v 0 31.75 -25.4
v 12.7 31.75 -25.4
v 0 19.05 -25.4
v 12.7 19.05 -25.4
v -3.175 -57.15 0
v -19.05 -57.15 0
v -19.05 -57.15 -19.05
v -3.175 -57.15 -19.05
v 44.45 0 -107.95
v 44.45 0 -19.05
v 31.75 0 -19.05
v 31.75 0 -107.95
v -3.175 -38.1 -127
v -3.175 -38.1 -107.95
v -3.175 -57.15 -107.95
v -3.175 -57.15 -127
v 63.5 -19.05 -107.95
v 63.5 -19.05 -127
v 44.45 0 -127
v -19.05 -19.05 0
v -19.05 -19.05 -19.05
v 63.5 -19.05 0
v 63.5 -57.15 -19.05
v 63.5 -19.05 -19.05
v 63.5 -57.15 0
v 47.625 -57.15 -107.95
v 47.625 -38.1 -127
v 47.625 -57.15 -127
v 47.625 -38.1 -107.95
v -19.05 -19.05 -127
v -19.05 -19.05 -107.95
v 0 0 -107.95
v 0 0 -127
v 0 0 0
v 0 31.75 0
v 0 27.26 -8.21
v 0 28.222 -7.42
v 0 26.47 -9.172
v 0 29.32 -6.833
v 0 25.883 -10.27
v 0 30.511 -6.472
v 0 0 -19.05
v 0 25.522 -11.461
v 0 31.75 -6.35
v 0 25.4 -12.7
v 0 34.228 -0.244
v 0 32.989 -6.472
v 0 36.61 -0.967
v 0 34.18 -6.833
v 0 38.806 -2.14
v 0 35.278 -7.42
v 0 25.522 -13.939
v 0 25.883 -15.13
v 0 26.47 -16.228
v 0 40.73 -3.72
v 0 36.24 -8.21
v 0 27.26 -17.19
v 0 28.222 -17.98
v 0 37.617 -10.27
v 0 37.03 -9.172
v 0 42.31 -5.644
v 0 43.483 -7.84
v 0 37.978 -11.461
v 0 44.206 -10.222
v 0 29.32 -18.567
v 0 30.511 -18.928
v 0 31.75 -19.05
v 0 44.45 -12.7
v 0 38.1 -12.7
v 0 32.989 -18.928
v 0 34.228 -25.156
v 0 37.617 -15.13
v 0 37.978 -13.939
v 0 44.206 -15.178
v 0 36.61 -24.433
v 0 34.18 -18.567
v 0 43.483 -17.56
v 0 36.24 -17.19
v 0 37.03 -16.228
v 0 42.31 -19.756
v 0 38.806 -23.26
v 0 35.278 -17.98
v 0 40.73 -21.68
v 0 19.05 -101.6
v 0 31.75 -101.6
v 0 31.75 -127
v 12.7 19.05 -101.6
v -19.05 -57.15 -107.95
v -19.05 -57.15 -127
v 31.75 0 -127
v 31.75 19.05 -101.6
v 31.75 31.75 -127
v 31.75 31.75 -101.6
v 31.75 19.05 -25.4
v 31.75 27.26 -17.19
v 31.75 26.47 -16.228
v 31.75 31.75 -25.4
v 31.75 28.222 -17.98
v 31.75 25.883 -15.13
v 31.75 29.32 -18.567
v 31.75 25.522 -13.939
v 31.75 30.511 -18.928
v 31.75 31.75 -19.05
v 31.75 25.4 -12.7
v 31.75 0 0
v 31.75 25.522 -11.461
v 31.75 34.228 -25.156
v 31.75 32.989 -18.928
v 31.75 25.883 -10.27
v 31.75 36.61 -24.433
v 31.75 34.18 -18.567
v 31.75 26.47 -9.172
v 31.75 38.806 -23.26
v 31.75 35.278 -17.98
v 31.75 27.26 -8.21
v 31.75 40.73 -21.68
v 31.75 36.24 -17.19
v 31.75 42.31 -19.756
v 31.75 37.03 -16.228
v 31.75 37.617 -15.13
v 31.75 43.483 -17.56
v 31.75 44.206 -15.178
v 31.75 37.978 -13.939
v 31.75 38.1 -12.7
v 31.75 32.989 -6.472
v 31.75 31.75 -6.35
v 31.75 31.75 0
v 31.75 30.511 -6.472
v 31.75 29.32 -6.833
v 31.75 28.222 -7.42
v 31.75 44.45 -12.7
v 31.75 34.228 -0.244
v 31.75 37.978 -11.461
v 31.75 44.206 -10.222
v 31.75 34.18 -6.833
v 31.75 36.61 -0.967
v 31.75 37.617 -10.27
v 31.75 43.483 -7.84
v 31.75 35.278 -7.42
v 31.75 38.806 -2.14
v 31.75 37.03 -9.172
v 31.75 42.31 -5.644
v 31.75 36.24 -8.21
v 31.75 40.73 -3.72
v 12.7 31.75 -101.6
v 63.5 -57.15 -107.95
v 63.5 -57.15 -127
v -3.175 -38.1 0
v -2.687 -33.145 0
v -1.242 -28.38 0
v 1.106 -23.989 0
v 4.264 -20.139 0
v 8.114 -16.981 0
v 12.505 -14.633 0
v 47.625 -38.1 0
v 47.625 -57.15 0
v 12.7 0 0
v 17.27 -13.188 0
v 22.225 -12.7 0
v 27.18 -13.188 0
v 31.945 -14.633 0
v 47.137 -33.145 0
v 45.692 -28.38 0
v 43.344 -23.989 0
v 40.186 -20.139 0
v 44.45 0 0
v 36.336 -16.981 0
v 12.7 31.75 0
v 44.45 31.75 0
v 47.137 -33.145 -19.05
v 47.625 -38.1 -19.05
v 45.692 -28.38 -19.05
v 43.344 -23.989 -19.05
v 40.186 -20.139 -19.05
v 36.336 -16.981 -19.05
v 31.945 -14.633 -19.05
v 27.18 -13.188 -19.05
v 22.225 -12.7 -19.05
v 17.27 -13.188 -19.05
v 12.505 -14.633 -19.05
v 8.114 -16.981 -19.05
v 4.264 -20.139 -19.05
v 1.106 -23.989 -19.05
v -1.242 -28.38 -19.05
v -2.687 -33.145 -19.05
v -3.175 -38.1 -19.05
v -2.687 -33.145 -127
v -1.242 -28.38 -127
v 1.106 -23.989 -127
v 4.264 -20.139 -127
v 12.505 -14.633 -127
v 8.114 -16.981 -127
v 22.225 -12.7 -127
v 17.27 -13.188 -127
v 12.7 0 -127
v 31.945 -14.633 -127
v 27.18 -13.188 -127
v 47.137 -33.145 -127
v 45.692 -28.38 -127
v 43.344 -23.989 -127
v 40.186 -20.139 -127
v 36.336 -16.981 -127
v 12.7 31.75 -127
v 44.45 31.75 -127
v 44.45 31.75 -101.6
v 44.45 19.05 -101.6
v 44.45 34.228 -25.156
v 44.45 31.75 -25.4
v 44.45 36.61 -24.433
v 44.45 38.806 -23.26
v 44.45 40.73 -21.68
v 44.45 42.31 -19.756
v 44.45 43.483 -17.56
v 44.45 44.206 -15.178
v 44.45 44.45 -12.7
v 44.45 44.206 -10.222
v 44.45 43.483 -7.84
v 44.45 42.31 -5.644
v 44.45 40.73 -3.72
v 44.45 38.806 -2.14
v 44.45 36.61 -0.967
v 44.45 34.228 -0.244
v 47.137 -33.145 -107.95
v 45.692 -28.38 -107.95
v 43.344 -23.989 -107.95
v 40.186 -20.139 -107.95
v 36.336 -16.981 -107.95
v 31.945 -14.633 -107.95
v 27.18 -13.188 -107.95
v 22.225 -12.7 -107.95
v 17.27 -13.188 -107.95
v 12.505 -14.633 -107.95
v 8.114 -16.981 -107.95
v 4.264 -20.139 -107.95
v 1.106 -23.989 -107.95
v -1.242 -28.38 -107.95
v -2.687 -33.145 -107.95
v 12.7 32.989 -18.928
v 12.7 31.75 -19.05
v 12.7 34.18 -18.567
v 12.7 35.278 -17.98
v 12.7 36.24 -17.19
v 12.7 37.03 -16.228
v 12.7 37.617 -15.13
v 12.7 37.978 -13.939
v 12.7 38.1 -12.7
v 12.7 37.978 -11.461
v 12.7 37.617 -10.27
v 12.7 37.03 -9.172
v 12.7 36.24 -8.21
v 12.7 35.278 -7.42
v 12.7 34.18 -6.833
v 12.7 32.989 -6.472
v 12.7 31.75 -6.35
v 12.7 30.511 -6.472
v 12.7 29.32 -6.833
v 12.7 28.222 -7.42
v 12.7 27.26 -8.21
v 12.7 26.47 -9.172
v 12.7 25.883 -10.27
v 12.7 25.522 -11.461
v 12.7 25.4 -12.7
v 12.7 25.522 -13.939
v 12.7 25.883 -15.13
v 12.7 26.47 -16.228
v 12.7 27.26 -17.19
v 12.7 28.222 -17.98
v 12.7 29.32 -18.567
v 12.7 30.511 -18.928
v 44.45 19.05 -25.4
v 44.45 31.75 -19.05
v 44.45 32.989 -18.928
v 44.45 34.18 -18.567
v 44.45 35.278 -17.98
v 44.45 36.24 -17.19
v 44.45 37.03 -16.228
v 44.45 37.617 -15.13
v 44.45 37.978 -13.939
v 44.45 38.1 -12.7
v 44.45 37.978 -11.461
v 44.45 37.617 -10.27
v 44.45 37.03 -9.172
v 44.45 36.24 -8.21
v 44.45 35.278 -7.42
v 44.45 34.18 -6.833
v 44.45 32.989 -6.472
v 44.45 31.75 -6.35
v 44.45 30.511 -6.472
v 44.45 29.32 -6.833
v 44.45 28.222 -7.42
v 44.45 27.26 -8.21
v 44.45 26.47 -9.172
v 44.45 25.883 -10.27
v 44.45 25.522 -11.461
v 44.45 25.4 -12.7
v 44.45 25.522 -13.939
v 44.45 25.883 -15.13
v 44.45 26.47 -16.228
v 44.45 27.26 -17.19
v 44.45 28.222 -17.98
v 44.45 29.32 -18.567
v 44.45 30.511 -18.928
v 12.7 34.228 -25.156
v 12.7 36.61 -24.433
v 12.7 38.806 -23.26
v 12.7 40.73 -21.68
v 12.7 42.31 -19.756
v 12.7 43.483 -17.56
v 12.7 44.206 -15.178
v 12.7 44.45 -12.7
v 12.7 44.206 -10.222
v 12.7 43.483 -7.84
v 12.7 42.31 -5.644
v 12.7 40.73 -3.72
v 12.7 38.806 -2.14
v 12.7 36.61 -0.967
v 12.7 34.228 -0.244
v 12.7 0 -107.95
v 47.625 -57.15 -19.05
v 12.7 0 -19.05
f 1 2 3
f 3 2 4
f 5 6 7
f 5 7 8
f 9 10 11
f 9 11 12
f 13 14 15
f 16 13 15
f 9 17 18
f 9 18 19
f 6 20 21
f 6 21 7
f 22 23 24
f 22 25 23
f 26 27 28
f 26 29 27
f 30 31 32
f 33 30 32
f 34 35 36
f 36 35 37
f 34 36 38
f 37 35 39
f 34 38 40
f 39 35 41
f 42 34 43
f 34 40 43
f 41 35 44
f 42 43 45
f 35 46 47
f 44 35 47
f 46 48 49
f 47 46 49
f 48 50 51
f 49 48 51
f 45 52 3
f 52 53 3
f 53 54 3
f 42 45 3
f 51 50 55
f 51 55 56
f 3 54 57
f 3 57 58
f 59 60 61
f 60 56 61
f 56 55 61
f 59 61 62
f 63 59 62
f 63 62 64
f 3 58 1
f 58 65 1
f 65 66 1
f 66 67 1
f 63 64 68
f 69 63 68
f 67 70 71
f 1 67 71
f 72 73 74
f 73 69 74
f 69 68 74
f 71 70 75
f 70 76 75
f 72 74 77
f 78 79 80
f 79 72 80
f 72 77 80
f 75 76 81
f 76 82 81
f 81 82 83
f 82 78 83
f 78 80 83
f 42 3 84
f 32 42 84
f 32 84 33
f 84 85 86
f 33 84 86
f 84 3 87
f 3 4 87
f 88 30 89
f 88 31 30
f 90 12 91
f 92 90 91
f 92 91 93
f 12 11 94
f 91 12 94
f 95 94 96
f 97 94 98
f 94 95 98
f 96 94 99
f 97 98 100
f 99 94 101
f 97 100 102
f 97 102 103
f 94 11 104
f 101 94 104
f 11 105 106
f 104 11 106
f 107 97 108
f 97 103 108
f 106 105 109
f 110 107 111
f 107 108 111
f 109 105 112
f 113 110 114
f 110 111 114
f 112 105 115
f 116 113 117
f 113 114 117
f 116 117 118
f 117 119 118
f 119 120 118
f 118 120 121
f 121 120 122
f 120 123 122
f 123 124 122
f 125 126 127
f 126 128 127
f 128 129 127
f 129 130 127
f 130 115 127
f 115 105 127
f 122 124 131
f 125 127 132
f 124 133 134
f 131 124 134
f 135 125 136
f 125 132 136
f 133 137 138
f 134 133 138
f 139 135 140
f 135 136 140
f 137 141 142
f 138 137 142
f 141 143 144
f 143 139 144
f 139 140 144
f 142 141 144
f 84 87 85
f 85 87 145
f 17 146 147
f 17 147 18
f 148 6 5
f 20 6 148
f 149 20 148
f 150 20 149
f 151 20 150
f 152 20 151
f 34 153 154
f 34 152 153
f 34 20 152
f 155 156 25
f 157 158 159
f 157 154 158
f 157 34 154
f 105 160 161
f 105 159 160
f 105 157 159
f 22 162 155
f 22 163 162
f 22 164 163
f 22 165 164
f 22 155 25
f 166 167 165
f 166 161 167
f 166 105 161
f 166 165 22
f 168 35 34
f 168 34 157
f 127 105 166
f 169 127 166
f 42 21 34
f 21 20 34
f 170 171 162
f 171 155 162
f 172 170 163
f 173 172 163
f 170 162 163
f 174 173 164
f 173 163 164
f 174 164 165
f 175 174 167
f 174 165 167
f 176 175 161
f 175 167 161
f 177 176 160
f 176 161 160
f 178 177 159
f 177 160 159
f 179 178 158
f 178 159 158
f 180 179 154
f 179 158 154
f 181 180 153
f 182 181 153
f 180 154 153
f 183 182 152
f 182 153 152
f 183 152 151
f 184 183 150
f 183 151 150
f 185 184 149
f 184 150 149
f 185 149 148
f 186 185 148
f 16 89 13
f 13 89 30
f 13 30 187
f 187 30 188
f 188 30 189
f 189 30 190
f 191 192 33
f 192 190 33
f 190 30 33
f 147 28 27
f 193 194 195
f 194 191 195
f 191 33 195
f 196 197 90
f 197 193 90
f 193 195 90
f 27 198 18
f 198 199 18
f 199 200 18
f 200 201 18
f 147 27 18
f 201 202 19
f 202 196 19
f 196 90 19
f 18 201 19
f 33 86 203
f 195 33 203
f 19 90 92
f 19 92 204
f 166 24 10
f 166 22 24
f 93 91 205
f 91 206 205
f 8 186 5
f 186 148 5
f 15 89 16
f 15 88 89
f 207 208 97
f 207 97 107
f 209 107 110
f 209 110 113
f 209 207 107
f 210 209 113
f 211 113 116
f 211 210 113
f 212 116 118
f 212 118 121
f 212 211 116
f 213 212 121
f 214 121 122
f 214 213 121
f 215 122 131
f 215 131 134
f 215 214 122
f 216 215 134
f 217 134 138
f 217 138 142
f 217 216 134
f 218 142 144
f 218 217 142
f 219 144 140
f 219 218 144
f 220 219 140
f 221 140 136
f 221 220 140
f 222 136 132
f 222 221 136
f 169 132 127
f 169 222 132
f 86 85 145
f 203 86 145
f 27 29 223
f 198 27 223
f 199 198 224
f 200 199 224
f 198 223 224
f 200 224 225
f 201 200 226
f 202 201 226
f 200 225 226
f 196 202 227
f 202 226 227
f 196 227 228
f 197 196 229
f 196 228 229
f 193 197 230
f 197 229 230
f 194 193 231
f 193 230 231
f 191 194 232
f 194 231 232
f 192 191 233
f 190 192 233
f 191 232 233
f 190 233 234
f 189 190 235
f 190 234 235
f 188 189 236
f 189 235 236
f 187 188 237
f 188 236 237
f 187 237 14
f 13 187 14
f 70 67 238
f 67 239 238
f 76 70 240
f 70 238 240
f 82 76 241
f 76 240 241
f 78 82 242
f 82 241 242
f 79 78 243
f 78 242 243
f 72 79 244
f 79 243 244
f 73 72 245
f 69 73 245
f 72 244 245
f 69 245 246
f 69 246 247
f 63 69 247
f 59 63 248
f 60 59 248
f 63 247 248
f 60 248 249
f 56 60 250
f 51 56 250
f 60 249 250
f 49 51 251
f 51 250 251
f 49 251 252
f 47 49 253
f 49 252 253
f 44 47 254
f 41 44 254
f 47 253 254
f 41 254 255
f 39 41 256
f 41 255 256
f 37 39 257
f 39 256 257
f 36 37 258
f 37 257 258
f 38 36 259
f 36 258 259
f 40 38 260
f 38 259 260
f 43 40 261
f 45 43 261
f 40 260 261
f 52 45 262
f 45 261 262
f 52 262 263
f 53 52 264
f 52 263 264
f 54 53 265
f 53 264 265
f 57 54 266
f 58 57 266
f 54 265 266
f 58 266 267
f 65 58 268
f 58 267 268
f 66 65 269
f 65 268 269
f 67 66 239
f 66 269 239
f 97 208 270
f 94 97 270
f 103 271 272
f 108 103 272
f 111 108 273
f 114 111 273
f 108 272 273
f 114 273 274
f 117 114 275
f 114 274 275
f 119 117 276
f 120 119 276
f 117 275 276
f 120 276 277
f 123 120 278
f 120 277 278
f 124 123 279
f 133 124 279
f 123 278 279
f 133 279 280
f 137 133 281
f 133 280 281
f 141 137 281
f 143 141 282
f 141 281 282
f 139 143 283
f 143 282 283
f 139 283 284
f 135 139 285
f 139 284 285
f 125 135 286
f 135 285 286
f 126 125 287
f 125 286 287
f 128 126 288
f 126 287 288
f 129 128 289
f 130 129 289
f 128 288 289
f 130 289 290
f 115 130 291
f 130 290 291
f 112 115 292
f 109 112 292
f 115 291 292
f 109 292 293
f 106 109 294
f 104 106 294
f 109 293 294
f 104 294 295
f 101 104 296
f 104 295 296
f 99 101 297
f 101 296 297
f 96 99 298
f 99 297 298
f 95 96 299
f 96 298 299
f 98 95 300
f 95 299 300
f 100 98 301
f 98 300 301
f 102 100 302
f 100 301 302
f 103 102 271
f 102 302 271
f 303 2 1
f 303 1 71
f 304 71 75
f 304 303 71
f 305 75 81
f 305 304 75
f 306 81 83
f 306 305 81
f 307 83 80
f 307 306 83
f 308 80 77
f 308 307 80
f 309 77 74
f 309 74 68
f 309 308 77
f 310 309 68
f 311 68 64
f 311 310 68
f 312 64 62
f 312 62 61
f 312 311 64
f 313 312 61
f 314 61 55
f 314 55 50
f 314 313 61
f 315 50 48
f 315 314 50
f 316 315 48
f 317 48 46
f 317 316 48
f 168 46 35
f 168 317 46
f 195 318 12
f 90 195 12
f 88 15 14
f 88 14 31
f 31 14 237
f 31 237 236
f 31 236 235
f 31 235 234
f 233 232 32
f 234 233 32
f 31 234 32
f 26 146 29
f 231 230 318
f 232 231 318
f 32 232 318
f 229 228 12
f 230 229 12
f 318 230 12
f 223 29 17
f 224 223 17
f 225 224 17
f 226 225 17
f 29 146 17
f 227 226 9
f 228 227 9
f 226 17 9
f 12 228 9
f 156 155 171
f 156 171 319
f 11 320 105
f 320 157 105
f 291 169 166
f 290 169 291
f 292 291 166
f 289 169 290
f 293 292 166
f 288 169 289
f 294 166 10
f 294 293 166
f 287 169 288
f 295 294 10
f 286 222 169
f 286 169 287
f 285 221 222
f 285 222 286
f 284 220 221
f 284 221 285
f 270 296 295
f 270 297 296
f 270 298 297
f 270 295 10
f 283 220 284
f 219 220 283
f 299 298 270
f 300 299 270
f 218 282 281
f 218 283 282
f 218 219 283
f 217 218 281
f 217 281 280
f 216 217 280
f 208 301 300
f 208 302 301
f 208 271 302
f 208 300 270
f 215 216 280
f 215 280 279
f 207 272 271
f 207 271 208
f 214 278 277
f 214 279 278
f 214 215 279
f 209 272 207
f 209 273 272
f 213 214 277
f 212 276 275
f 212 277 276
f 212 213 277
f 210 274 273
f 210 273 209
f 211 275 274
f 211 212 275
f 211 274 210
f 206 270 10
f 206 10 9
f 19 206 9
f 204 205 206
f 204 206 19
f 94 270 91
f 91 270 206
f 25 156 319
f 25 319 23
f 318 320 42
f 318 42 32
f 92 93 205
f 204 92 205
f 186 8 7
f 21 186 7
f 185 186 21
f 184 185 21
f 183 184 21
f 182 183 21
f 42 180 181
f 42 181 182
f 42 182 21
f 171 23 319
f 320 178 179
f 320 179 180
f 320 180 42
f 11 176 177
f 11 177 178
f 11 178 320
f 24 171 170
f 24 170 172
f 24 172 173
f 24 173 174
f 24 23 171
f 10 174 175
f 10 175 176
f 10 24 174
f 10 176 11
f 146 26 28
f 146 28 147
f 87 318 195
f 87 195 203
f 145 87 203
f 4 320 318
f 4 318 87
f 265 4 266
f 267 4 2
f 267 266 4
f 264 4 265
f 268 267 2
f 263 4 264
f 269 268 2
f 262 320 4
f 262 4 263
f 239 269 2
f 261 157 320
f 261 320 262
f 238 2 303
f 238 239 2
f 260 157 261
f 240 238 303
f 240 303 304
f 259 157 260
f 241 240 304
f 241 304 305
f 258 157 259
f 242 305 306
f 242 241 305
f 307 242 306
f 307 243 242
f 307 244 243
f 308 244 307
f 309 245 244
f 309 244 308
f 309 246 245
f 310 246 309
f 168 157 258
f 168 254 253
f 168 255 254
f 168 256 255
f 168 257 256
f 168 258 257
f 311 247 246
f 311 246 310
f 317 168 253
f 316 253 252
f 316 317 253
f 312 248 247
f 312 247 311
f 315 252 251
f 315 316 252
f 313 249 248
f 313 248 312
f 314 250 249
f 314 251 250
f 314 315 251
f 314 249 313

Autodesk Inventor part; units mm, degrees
ref_plane "YZ Plane" through (0, 0, 0) normal (1, 0, 0) x (0, 1, 0)
ref_plane "XZ Plane" through (0, 0, 0) normal (0, 1, 0) x (-1, 0, 0)
ref_plane "XY Plane" through (0, 0, 0) normal (0, 0, 1) x (1, 0, 0)
sketch "Sketch1" plane through (0, 0, 0) normal (0, 0, 1) x (1, 0, 0)
  line L0 (0, 0) -> (44.45, 0)
  line L1 (44.45, 0) -> (44.45, 31.75)
  line L2 (44.45, 31.75) -> (31.75, 31.75)
  line L3 (31.75, 31.75) -> (31.75, 0)
  line L4 (0, 0) -> (0, 31.75)
  line L5 (0, 31.75) -> (12.7, 31.75)
  line L6 (12.7, 31.75) -> (12.7, 0)
  line L7 (63.5, -19.05) -> (44.45, 0)
  line L8 (-19.05, -19.05) -> (0, 0)
  line L9 (-19.05, -19.05) -> (-19.05, -57.15)
  line L10 (-19.05, -57.15) -> (0, -57.15)
  line L11 (0, -57.15) -> (63.5, -57.15)
  line L12 (63.5, -57.15) -> (63.5, -19.05)
  dimension "d0" = 44.45
  dimension "d1" = 31.75
  dimension "d2" = 12.7
  dimension "d3" = 31.75
  dimension "d4" = 12.7
  dimension "d9" = 38.1
extrude "Extrusion1" add sketch "Sketch1" against normal blind 127 contours L0 L7 L12 L11 L10 L9 L8
sketch "Sketch2" plane through (0, 0, 0) normal (0, 0, 1) x (1, 0, 0)
  line L0 (63.5, -57.15) -> (-19.05, -57.15) projected
  arc A0 (47.625, -38.1) -> (-3.175, -38.1) centre (22.225, -38.1) ccw
  line L1 (-3.175, -38.1) -> (-3.175, -57.15)
  line L2 (47.625, -38.1) -> (47.625, -57.15)
  point P0 (0, 0)
  dimension "d14" = 50.8
extrude "Extrusion2" cut sketch "Sketch2" against normal blind 127
sketch "Sketch3" plane through (0, 0, 0) normal (0, 0, 1) x (1, 0, 0)
  line L0 (0, 0) -> (-19.05, -19.05) projected
  line L1 (0, 0) -> (0, 31.75)
  line L2 (0, 31.75) -> (12.7, 31.75)
  line L3 (12.7, 31.75) -> (12.7, 0)
  line L4 (44.45, 0) -> (0, 0) projected
  line L5 (44.45, 0) -> (44.45, 31.75)
  line L6 (44.45, 31.75) -> (31.75, 31.75)
  line L7 (31.75, 31.75) -> (31.75, 0)
  dimension "d17" = 31.75
  dimension "d18" = 12.7
  dimension "d19" = 31.75
  dimension "d20" = 12.7
extrude "Extrusion3" add sketch "Sketch3" against normal blind 127 contours L1 L2 L3 L4
sketch "Sketch4" plane through (0, 0, 0) normal (0, 0, 1) x (1, 0, 0)
  line L0 (12.7, 0) -> (44.45, 0) projected
  line L1 (44.45, 0) -> (44.45, 31.75)
  line L2 (44.45, 31.75) -> (31.75, 31.75)
  line L3 (31.75, 31.75) -> (31.75, 0)
  point P0 (0, 0)
  dimension "d23" = 31.75
  dimension "d24" = 12.7
extrude "Extrusion4" add sketch "Sketch4" against normal blind 127
sketch "Sketch5" plane through (63.5, -57.15, 0) normal (1, 0, 0) x (0, 0, -1)
  line L0 (107.95, 11.1125) -> (107.95, 57.15)
  line L1 (0, 57.15) -> (127, 57.15) projected
  line L2 (19.05, 10.2158) -> (19.05, 57.15)
  line L3 (107.95, 57.15) -> (19.05, 57.15)
  line L4 (19.05, 10.2158) -> (19.05, 0)
  line L5 (0, 0) -> (127, 0) projected
  line L6 (107.95, 11.1125) -> (107.95, 0)
extrude "Extrusion5" cut sketch "Sketch5" against normal blind 127
sketch "Sketch6" plane through (0, 0, 0) normal (0, 0, 1) x (1, 0, 0)
  line L0 (12.7, 31.75) -> (33.3375, 31.75)
  line L1 (31.75, 0) -> (31.75, 31.75) projected
  line L2 (33.3375, 31.75) -> (31.75, 0)
  line L3 (12.7, 0) -> (31.75, 0) projected
  line L4 (31.75, 0) -> (12.7, 0)
  line L5 (12.7, 31.75) -> (12.7, 0) projected
  line L6 (12.7, 0) -> (12.7, 31.75)
  point P0 (0, 0)
extrude "Extrusion6" add sketch "Sketch6" against normal blind 127 contours L0 L1 L3 L5
sketch "Sketch7" plane through (44.45, 0, 0) normal (1, 0, 0) x (0, 0, -1)
  line L0 (0, 31.75) -> (127, 31.75) projected
  circle A0 centre (12.7, 31.75) radius 12.7
  point P0 (0, 0)
  point P1 (25.4, 31.75)
  dimension "d35" = 25.4
extrude "Extrusion7" add sketch "Sketch7" against normal blind 44.45 contours A0 L0 picked at (10.6191, 40.4828)
sketch "Sketch8" plane through (44.45, 0, -127) normal (1, 0, 0) x (0, 0, -1)
  circle A0 centre (-114.3, 31.75) radius 6.35
  point P0 (-127, 0)
  dimension "d39" = 12.7
extrude "Extrusion8" cut sketch "Sketch8" against normal blind 44.45
sketch "Sketch9" plane through (44.45, 0, -127) normal (1, 0, 0) x (0, 0, -1)
  line L0 (-101.6, 31.75) -> (0, 31.75) projected
  line L1 (-101.6, 31.75) -> (-101.6, 19.05)
  line L2 (-101.6, 19.05) -> (-25.4, 19.05)
  line L3 (-25.4, 19.05) -> (-25.4, 31.75)
  point P0 (-127, 0)
  dimension "d42" = 12.7
extrude "Extrusion9" cut sketch "Sketch9" against normal through all
sketch "Sketch10" plane through (0, 0, 0) normal (0, 0, 1) x (1, 0, 0)
  line L0 (12.7, 0) -> (12.7, 44.45)
  line L1 (31.75, 0) -> (31.75, 44.45)
  line L2 (44.45, 44.45) -> (0, 44.45) projected
  line L3 (12.7, 44.45) -> (31.75, 44.45)
  line L4 (12.7, 0) -> (31.75, 0)
  line L5 (0, 0) -> (44.45, 0) projected
  dimension "d50" = 19.05
extrude "Extrusion10" cut sketch "Sketch10" against normal blind 127
properties part number "Assignment 2.4"
